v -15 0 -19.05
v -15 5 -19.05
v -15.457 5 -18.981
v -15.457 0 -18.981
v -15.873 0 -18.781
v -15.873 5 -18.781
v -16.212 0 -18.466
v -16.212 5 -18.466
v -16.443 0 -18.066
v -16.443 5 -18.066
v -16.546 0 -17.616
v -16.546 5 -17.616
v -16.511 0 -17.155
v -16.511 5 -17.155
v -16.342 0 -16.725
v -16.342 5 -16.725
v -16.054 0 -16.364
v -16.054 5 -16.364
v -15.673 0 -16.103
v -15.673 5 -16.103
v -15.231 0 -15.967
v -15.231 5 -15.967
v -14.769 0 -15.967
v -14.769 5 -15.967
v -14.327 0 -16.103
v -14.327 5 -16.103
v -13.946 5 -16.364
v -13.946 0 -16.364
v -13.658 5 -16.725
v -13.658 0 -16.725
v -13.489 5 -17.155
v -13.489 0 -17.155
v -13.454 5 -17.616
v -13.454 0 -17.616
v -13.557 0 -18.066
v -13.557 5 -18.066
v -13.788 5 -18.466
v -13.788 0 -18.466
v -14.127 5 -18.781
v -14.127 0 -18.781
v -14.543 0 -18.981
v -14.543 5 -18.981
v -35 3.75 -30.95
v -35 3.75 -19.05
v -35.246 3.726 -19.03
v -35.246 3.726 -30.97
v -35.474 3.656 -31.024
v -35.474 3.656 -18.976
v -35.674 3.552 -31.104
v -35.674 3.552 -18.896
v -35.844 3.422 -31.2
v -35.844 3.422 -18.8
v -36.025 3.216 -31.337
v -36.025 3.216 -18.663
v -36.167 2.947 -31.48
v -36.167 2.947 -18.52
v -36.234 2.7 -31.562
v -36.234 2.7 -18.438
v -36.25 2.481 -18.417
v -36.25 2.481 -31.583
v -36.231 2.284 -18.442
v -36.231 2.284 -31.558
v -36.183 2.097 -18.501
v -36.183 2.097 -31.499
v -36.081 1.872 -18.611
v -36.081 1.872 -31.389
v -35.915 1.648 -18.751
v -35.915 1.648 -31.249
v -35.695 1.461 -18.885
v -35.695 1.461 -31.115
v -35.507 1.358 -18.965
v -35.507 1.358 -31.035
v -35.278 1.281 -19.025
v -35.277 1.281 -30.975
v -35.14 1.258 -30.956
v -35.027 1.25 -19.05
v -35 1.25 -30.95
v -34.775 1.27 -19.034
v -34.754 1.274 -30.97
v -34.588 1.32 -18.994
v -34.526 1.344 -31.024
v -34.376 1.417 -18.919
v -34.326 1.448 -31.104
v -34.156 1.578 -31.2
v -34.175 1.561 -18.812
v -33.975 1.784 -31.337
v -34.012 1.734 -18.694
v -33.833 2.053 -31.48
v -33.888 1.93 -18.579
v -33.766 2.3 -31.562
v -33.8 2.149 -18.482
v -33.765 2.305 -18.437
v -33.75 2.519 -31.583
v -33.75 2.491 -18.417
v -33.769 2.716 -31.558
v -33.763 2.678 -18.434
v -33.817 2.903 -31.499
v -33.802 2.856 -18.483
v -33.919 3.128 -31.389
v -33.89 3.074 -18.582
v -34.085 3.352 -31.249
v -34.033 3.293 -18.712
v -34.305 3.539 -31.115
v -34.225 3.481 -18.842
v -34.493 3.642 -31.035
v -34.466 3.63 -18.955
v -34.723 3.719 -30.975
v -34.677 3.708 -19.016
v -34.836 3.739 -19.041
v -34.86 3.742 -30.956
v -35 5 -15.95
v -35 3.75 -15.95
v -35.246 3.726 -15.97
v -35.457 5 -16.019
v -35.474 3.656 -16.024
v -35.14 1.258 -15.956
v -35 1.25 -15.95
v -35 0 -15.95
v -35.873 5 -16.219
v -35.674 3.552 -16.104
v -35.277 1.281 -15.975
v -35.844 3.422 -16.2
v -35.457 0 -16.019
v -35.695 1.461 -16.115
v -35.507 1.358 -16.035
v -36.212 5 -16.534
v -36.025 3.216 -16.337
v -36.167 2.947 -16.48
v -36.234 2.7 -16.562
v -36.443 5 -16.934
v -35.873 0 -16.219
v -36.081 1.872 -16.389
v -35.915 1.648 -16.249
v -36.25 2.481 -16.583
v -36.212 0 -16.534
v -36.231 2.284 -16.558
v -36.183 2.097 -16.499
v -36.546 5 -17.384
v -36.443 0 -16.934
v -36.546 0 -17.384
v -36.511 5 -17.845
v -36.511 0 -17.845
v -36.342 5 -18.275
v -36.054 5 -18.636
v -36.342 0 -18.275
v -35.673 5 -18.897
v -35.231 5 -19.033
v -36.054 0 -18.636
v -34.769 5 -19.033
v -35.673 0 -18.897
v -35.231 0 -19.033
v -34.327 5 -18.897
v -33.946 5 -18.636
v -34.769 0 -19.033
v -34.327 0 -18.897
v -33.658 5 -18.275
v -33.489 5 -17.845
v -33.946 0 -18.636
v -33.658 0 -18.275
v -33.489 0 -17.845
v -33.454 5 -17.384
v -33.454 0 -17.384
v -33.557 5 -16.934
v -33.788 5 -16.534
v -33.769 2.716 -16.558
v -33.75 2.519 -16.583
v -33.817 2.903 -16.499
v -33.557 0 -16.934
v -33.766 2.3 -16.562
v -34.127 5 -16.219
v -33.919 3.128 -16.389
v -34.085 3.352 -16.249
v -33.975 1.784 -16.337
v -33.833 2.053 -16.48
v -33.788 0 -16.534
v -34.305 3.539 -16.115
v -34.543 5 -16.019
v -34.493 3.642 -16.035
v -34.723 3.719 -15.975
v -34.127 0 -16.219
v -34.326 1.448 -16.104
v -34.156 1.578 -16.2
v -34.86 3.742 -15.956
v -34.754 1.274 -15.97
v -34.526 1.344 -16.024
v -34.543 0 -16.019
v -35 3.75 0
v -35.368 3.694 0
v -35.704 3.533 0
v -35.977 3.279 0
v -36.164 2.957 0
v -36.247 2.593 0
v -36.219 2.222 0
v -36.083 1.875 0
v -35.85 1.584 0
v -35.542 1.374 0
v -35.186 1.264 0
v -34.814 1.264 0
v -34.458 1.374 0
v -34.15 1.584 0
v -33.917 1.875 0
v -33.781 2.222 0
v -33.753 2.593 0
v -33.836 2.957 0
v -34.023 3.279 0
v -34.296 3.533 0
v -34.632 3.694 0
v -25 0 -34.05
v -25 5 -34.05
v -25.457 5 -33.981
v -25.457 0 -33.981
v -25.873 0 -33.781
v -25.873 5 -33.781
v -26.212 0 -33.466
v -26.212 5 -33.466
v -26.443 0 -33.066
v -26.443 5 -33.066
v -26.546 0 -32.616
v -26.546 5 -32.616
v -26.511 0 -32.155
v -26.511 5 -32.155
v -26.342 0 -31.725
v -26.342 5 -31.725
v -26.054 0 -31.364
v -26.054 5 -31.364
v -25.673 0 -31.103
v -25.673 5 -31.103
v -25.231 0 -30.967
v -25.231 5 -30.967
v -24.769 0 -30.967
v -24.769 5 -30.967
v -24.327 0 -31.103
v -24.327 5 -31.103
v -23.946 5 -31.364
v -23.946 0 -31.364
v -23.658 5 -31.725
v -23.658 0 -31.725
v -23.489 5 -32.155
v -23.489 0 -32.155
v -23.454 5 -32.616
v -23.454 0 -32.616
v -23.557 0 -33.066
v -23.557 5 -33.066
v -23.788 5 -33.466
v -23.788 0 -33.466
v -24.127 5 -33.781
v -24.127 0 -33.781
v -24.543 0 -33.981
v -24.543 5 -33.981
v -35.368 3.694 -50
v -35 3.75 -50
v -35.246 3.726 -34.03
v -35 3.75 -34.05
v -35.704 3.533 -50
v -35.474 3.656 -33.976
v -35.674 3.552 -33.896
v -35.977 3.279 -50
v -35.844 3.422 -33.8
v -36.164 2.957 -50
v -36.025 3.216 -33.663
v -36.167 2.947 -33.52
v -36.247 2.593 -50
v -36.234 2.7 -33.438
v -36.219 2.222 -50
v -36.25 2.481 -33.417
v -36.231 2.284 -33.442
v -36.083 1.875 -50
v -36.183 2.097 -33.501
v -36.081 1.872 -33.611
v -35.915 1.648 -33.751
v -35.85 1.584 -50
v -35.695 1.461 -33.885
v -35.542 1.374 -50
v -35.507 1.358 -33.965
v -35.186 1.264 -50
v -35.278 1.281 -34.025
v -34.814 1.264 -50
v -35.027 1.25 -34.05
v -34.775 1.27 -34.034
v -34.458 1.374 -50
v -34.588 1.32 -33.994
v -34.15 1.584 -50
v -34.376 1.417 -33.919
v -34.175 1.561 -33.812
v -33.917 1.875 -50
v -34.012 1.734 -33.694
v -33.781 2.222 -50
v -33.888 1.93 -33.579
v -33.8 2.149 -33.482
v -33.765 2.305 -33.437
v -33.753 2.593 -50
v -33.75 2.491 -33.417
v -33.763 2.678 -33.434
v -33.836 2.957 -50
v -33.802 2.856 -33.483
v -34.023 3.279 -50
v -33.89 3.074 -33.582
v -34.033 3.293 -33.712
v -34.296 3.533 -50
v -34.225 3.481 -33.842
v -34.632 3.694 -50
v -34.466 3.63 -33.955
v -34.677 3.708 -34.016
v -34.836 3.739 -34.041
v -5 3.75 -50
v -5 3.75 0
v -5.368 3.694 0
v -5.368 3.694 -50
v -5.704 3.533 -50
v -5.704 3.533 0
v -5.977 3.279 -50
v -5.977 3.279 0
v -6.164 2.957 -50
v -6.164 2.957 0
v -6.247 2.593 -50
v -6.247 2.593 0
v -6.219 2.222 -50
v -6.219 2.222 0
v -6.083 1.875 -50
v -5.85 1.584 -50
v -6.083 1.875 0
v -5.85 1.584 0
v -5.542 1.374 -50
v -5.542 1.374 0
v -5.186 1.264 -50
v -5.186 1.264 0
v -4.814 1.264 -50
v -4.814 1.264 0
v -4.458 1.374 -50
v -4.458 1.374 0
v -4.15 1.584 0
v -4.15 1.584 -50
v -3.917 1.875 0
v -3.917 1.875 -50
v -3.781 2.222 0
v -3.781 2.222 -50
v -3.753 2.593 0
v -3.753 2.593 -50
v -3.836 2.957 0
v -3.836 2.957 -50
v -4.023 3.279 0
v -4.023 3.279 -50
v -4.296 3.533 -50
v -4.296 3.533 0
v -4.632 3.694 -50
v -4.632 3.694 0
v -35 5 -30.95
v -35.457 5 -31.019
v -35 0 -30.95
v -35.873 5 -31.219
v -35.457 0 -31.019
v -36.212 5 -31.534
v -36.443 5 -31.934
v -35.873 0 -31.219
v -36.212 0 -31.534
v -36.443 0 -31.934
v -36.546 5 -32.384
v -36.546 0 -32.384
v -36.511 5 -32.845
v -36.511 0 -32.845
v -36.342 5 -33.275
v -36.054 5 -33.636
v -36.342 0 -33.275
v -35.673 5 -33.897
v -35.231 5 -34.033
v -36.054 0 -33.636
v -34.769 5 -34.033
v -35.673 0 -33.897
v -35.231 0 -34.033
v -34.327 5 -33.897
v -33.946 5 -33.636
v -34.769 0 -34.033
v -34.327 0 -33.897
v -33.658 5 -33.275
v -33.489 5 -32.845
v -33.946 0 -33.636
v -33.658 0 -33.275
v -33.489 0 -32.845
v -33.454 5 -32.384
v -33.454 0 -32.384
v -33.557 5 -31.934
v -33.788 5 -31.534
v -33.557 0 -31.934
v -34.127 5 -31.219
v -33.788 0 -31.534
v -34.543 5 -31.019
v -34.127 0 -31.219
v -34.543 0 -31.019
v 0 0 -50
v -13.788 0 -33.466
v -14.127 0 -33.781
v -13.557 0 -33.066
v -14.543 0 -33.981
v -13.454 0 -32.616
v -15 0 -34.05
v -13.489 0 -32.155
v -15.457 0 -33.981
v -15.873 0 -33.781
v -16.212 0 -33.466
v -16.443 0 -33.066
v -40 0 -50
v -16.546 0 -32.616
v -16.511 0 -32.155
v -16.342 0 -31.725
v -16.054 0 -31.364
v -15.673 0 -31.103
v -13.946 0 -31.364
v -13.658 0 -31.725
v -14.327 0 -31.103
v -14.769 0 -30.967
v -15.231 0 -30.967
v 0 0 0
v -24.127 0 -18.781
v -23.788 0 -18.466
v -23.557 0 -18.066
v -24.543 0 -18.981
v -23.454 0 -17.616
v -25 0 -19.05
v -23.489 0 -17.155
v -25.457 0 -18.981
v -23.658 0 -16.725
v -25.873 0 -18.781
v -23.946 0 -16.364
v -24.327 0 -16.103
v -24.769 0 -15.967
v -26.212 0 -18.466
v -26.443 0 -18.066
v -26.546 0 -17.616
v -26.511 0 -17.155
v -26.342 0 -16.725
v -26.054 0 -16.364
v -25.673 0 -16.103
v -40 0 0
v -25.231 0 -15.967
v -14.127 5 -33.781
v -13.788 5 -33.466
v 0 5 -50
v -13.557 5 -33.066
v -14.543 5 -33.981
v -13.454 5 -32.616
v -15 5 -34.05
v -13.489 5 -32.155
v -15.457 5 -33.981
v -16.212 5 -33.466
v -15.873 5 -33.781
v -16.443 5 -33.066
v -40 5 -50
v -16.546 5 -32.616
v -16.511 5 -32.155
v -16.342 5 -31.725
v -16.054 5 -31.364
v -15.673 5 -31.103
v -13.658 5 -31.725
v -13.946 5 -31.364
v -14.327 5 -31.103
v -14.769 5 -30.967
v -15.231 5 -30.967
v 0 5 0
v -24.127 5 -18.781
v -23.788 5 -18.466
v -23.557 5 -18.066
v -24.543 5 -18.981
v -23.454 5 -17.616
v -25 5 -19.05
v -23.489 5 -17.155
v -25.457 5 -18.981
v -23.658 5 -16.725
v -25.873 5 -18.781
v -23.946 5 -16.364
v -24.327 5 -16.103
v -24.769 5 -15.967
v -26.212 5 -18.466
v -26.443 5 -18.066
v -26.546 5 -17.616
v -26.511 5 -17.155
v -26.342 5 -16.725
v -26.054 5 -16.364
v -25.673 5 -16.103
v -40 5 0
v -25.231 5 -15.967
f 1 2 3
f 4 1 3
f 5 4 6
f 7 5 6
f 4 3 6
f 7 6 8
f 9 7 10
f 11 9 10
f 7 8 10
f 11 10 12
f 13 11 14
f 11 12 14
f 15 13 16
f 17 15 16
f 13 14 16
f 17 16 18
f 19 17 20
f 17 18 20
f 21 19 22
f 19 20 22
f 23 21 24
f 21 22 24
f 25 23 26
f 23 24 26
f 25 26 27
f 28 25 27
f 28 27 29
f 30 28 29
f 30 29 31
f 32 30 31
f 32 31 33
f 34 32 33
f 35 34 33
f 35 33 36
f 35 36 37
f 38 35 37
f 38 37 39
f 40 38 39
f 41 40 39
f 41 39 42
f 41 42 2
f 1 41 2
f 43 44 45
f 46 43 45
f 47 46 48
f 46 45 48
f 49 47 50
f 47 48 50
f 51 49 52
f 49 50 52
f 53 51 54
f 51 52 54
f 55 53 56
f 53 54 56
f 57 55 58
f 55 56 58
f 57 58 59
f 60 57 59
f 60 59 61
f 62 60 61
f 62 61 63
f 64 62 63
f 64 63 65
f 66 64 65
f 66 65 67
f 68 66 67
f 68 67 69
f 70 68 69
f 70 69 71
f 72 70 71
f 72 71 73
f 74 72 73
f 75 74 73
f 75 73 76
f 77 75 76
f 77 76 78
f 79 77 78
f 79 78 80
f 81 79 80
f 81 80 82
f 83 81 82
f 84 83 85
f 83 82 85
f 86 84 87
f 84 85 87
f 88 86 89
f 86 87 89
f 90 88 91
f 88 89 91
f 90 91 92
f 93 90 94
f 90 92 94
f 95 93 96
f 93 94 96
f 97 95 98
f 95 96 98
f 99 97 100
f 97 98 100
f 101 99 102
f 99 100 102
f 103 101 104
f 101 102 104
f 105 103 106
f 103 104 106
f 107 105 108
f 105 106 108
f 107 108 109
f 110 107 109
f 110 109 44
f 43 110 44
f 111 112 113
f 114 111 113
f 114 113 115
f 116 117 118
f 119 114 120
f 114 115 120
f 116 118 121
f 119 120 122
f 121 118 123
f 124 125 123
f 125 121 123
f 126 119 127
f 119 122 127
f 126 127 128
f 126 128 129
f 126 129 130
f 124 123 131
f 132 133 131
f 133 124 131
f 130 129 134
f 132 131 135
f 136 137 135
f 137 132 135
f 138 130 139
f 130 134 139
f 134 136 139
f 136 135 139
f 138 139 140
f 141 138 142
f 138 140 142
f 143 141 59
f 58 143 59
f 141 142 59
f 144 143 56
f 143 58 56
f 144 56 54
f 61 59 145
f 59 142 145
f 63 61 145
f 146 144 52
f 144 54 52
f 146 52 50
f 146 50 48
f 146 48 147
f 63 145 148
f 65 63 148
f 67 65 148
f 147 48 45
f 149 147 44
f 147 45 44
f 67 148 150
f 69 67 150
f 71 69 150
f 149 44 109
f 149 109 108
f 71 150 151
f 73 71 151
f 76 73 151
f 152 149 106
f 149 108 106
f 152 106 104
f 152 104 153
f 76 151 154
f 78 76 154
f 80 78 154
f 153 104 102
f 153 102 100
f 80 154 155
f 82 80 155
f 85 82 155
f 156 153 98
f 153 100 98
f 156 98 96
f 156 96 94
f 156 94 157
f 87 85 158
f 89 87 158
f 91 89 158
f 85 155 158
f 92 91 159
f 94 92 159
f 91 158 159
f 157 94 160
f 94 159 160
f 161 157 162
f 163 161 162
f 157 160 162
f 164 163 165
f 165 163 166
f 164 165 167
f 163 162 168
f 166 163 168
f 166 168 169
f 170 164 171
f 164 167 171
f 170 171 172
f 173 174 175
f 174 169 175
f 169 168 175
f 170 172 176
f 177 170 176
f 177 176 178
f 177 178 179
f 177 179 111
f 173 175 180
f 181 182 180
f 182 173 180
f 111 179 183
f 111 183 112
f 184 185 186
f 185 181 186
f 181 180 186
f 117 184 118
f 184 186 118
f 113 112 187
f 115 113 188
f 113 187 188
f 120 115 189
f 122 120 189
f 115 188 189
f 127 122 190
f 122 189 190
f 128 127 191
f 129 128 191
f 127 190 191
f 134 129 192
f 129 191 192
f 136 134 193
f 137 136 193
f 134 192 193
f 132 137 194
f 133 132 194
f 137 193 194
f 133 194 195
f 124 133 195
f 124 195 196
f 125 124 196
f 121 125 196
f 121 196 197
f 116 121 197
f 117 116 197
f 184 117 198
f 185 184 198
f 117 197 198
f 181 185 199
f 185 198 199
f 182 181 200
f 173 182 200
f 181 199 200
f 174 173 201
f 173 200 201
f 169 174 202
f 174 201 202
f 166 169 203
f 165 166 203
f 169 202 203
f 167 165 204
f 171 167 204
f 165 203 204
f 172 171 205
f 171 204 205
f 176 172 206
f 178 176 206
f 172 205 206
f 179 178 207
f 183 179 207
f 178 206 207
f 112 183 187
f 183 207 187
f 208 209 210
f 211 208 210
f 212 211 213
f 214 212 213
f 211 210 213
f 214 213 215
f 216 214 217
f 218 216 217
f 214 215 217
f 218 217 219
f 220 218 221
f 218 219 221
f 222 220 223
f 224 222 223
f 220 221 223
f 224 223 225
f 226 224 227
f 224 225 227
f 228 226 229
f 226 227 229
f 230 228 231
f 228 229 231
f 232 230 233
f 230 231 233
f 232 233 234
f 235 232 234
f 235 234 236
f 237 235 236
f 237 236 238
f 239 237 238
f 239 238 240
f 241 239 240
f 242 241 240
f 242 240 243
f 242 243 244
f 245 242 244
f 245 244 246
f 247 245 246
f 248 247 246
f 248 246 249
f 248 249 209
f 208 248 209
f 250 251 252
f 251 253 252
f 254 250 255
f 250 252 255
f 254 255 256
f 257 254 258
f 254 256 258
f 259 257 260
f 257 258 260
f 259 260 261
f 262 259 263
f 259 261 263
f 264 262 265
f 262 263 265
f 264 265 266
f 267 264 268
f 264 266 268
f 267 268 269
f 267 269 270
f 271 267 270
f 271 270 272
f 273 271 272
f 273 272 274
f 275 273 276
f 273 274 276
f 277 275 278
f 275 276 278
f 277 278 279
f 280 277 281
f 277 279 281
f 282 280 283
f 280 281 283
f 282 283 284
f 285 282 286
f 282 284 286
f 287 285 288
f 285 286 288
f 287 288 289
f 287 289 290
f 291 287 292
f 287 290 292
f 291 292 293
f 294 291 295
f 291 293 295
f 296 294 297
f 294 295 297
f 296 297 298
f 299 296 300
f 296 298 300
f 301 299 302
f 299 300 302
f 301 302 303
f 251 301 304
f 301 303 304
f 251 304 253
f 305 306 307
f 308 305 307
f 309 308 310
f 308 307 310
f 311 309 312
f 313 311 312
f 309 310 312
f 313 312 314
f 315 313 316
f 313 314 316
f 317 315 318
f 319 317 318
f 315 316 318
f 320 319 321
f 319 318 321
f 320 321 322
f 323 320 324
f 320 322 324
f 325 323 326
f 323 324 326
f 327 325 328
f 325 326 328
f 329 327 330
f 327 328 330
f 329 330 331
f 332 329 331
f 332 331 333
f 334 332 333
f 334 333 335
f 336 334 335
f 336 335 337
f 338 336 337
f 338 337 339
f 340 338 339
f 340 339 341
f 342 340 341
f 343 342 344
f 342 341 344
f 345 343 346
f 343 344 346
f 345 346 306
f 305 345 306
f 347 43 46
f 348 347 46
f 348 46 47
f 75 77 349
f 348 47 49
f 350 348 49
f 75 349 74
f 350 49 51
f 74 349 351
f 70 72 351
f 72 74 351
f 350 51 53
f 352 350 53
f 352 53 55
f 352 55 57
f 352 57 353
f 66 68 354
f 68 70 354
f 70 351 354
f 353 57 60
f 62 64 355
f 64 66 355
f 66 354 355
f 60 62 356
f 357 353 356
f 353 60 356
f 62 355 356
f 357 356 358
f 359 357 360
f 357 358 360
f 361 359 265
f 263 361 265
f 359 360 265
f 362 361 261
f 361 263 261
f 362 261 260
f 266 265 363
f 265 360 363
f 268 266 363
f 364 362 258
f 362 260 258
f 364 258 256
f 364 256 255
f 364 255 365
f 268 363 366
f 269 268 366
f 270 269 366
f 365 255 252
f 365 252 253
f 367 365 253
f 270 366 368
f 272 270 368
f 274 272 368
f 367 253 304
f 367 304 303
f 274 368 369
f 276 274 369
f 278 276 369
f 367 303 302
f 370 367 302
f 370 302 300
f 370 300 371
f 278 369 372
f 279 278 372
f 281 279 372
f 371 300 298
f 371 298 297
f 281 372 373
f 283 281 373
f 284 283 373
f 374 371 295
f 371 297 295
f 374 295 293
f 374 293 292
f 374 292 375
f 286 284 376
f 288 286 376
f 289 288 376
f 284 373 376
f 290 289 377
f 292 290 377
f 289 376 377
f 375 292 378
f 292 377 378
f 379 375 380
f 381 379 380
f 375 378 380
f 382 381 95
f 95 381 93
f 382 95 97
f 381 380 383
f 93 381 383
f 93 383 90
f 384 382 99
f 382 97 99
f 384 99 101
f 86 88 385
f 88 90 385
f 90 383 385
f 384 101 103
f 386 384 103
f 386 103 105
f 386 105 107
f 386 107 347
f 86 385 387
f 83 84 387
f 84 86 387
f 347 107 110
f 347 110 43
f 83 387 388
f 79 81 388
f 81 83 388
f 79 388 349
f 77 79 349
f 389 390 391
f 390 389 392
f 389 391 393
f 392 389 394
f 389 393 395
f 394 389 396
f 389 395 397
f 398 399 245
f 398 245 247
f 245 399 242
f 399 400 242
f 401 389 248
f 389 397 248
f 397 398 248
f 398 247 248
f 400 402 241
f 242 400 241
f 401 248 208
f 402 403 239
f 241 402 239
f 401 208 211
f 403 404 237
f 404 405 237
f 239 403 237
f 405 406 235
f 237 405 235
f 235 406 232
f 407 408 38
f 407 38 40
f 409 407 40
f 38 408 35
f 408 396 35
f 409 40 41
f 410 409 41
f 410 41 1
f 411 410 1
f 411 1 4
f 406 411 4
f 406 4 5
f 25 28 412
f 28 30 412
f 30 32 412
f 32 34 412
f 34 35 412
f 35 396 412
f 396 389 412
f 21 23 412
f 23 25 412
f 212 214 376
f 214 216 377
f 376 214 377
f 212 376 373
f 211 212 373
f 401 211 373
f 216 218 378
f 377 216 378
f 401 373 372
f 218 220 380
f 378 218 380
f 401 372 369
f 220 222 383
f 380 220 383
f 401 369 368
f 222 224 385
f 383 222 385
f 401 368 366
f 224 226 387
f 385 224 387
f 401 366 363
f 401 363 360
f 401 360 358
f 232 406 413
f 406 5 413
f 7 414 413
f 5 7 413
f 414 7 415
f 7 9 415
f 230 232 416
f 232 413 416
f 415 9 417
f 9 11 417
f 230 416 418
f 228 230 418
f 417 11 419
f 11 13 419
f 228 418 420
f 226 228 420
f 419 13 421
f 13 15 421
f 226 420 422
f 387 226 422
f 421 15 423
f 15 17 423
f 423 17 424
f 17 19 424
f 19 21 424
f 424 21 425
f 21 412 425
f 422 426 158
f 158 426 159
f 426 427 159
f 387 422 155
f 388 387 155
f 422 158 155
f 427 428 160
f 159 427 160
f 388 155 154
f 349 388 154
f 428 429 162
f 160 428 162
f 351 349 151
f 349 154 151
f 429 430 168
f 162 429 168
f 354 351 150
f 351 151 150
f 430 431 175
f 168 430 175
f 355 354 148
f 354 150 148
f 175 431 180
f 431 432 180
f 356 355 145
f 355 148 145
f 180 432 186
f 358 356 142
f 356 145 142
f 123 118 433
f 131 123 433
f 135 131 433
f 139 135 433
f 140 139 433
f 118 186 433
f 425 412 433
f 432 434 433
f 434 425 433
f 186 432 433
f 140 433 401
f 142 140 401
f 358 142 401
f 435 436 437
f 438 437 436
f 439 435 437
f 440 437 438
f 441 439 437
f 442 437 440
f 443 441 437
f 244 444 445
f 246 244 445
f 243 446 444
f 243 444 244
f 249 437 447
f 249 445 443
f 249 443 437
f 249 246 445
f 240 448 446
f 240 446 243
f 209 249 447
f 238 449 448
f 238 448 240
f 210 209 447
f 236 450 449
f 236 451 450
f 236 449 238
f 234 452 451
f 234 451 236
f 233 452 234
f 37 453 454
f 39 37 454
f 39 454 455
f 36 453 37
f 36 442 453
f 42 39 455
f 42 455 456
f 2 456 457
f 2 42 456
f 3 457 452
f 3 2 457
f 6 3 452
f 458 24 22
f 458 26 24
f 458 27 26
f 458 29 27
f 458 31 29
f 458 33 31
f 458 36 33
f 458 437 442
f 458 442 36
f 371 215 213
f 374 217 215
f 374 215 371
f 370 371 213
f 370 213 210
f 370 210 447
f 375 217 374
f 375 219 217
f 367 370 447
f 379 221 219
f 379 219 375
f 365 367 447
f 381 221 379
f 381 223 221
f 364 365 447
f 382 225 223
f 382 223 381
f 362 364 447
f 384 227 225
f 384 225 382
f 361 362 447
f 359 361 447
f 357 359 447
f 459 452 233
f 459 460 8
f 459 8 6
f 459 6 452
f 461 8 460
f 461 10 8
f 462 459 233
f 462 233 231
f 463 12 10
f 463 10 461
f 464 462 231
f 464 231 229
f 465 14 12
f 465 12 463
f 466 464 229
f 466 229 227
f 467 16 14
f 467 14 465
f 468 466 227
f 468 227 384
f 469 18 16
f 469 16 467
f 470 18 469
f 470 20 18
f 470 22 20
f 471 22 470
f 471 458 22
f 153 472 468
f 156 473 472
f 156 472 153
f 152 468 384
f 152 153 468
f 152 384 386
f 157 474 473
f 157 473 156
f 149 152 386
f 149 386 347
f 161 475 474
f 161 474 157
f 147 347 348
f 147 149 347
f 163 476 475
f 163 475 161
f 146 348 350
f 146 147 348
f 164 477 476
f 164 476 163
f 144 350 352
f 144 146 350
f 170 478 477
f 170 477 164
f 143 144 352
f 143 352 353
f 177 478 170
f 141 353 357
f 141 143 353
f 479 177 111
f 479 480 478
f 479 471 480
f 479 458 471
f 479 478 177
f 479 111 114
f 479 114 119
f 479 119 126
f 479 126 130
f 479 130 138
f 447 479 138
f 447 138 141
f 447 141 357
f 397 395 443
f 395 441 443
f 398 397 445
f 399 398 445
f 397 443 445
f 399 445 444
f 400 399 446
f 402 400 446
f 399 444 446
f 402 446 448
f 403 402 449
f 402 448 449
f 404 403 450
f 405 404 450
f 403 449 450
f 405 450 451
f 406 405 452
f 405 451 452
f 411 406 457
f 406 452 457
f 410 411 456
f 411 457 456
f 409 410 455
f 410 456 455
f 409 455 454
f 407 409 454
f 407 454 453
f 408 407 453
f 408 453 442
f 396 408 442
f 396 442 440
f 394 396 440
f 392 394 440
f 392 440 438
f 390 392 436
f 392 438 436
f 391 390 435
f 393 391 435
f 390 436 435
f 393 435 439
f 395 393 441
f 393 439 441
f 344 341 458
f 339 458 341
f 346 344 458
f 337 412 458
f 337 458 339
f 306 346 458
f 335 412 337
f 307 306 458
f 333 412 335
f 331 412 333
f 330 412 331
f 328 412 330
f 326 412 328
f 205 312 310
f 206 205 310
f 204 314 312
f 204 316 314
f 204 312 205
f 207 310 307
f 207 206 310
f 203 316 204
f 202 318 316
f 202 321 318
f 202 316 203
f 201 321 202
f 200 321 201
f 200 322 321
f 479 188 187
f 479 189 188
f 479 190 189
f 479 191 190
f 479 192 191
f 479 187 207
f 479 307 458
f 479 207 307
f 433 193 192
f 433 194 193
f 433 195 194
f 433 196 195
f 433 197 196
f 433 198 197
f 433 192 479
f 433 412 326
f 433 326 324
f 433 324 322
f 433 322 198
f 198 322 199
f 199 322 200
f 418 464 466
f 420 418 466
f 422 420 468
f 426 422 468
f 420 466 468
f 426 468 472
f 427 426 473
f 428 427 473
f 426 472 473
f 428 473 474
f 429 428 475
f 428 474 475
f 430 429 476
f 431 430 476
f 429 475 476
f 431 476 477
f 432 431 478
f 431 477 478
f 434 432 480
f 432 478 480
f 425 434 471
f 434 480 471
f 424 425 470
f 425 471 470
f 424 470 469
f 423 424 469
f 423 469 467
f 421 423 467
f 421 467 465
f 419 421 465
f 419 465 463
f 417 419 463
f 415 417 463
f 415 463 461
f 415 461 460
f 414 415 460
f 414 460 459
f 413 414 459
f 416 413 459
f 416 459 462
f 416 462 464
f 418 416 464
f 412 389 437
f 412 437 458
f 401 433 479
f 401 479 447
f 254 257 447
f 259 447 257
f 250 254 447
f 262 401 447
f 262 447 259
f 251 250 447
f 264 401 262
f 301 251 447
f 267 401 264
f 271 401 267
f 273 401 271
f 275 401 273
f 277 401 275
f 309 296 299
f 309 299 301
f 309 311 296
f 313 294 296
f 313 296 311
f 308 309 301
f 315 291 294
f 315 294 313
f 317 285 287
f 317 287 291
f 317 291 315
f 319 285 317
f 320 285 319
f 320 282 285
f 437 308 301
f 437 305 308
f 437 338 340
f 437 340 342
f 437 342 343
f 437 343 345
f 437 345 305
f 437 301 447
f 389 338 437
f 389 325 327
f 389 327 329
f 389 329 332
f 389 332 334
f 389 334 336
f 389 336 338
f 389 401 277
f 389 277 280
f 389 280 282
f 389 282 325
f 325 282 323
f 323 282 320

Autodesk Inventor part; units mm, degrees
ref_plane "YZ Plane" through (0, 0, 0) normal (1, 0, 0) x (0, 1, 0)
ref_plane "XZ Plane" through (0, 0, 0) normal (0, 1, 0) x (-1, 0, 0)
ref_plane "XY Plane" through (0, 0, 0) normal (0, 0, 1) x (1, 0, 0)
sketch "スケッチ1" plane through (0, 0, 0) normal (0, 1, 0) x (-1, 0, 0)
  line L0 (0, 0) -> (40, 0)
  line L1 (40, 0) -> (40, -50)
  line L2 (40, -50) -> (0, -50)
  line L3 (0, -50) -> (0, 0)
  line L4 (35, -50) -> (35, 0)
  line L5 (30, -50) -> (30, 0)
  line L6 (25, -50) -> (25, 0)
  line L7 (20, -50) -> (20, 0)
  line L8 (15, -50) -> (15, 0)
  line L9 (10, -50) -> (10, 0)
  line L10 (5, -50) -> (5, 0)
  dimension "d0" = 40
  dimension "d1" = 50
  dimension "d2" = 5
  dimension "d6" = 5
extrude "押し出し1" add sketch "スケッチ1" along normal blind 5
sketch "スケッチ4" plane through (0, 0, 0) normal (0, -1, 0) x (1, 0, 0)
  line L0 (-40, -50) -> (-40, 0) projected
  line L1 (-40, -17.5) -> (0, -17.5)
  line L2 (0, 0) -> (0, -50) projected
  line L3 (0, -32.5) -> (-35, -32.5)
  line L4 (-40, 0) -> (0, 0) projected
  line L5 (0, -50) -> (-40, -50) projected
  line L6 (-25, -50) -> (-25, 0) projected
  line L7 (-20, -50) -> (-20, 0) projected
  line L8 (-15, -50) -> (-15, 0) projected
  line L9 (-40, -25) -> (0, -25)
  point P0 (-25, -17.5)
  point P1 (-15, -17.5)
  point P2 (-15, -32.5)
  point P3 (-25, -32.5)
  dimension "d49" = 15
  dimension "d50" = 15
hole "穴3" at (-15, 0, -17.5) at (-15, 0, -32.5) at (-25, 0, -17.5) at (-25, 0, -32.5) direction (0, 1, 0) diameter 3.1 end through all
sketch "スケッチ5" plane through (0, 0, -50) normal (0, 0, -1) x (-1, 0, 0)
  line L0 (40, 0) -> (40, 5) projected
  line L1 (40, 2.5) -> (0, 2.5)
  line L2 (0, 0) -> (0, 5) projected
  point P0 (35, 0)
  point P1 (35, 0)
  point P2 (35, 0)
  point P3 (5, 0)
  point P4 (5, 0)
  point P5 (5, 0)
  point P6 (35, 2.5)
  point P7 (5, 2.5)
hole "穴4" at (-35, 2.5, -50) at (-5, 2.5, -50) direction (0, 0, 1) diameter 2.5 end through all
sketch "スケッチ6" plane through (0, 5, 0) normal (0, 1, 0) x (1, 0, 0)
  line L0 (-40, 0) -> (0, 0) projected
  line L1 (-35, 0) -> (-35, 50)
  line L2 (-6.25, 0) -> (-6.25, 50) projected
  circle A0 centre (-15, 32.5) radius 1.55 projected
  circle A1 centre (-25, 32.5) radius 1.55 projected
  point P0 (-35, 32.5)
  point P1 (-35, 17.5)
  dimension "d52" = 15
  dimension "d60" = 10
hole "穴5" at (-35, 5, -32.5) at (-35, 5, -17.5) direction (0, -1, 0) diameter 3.1 end through all
properties part number "hand2_11" material "アルミニウム 6061-AHC"
